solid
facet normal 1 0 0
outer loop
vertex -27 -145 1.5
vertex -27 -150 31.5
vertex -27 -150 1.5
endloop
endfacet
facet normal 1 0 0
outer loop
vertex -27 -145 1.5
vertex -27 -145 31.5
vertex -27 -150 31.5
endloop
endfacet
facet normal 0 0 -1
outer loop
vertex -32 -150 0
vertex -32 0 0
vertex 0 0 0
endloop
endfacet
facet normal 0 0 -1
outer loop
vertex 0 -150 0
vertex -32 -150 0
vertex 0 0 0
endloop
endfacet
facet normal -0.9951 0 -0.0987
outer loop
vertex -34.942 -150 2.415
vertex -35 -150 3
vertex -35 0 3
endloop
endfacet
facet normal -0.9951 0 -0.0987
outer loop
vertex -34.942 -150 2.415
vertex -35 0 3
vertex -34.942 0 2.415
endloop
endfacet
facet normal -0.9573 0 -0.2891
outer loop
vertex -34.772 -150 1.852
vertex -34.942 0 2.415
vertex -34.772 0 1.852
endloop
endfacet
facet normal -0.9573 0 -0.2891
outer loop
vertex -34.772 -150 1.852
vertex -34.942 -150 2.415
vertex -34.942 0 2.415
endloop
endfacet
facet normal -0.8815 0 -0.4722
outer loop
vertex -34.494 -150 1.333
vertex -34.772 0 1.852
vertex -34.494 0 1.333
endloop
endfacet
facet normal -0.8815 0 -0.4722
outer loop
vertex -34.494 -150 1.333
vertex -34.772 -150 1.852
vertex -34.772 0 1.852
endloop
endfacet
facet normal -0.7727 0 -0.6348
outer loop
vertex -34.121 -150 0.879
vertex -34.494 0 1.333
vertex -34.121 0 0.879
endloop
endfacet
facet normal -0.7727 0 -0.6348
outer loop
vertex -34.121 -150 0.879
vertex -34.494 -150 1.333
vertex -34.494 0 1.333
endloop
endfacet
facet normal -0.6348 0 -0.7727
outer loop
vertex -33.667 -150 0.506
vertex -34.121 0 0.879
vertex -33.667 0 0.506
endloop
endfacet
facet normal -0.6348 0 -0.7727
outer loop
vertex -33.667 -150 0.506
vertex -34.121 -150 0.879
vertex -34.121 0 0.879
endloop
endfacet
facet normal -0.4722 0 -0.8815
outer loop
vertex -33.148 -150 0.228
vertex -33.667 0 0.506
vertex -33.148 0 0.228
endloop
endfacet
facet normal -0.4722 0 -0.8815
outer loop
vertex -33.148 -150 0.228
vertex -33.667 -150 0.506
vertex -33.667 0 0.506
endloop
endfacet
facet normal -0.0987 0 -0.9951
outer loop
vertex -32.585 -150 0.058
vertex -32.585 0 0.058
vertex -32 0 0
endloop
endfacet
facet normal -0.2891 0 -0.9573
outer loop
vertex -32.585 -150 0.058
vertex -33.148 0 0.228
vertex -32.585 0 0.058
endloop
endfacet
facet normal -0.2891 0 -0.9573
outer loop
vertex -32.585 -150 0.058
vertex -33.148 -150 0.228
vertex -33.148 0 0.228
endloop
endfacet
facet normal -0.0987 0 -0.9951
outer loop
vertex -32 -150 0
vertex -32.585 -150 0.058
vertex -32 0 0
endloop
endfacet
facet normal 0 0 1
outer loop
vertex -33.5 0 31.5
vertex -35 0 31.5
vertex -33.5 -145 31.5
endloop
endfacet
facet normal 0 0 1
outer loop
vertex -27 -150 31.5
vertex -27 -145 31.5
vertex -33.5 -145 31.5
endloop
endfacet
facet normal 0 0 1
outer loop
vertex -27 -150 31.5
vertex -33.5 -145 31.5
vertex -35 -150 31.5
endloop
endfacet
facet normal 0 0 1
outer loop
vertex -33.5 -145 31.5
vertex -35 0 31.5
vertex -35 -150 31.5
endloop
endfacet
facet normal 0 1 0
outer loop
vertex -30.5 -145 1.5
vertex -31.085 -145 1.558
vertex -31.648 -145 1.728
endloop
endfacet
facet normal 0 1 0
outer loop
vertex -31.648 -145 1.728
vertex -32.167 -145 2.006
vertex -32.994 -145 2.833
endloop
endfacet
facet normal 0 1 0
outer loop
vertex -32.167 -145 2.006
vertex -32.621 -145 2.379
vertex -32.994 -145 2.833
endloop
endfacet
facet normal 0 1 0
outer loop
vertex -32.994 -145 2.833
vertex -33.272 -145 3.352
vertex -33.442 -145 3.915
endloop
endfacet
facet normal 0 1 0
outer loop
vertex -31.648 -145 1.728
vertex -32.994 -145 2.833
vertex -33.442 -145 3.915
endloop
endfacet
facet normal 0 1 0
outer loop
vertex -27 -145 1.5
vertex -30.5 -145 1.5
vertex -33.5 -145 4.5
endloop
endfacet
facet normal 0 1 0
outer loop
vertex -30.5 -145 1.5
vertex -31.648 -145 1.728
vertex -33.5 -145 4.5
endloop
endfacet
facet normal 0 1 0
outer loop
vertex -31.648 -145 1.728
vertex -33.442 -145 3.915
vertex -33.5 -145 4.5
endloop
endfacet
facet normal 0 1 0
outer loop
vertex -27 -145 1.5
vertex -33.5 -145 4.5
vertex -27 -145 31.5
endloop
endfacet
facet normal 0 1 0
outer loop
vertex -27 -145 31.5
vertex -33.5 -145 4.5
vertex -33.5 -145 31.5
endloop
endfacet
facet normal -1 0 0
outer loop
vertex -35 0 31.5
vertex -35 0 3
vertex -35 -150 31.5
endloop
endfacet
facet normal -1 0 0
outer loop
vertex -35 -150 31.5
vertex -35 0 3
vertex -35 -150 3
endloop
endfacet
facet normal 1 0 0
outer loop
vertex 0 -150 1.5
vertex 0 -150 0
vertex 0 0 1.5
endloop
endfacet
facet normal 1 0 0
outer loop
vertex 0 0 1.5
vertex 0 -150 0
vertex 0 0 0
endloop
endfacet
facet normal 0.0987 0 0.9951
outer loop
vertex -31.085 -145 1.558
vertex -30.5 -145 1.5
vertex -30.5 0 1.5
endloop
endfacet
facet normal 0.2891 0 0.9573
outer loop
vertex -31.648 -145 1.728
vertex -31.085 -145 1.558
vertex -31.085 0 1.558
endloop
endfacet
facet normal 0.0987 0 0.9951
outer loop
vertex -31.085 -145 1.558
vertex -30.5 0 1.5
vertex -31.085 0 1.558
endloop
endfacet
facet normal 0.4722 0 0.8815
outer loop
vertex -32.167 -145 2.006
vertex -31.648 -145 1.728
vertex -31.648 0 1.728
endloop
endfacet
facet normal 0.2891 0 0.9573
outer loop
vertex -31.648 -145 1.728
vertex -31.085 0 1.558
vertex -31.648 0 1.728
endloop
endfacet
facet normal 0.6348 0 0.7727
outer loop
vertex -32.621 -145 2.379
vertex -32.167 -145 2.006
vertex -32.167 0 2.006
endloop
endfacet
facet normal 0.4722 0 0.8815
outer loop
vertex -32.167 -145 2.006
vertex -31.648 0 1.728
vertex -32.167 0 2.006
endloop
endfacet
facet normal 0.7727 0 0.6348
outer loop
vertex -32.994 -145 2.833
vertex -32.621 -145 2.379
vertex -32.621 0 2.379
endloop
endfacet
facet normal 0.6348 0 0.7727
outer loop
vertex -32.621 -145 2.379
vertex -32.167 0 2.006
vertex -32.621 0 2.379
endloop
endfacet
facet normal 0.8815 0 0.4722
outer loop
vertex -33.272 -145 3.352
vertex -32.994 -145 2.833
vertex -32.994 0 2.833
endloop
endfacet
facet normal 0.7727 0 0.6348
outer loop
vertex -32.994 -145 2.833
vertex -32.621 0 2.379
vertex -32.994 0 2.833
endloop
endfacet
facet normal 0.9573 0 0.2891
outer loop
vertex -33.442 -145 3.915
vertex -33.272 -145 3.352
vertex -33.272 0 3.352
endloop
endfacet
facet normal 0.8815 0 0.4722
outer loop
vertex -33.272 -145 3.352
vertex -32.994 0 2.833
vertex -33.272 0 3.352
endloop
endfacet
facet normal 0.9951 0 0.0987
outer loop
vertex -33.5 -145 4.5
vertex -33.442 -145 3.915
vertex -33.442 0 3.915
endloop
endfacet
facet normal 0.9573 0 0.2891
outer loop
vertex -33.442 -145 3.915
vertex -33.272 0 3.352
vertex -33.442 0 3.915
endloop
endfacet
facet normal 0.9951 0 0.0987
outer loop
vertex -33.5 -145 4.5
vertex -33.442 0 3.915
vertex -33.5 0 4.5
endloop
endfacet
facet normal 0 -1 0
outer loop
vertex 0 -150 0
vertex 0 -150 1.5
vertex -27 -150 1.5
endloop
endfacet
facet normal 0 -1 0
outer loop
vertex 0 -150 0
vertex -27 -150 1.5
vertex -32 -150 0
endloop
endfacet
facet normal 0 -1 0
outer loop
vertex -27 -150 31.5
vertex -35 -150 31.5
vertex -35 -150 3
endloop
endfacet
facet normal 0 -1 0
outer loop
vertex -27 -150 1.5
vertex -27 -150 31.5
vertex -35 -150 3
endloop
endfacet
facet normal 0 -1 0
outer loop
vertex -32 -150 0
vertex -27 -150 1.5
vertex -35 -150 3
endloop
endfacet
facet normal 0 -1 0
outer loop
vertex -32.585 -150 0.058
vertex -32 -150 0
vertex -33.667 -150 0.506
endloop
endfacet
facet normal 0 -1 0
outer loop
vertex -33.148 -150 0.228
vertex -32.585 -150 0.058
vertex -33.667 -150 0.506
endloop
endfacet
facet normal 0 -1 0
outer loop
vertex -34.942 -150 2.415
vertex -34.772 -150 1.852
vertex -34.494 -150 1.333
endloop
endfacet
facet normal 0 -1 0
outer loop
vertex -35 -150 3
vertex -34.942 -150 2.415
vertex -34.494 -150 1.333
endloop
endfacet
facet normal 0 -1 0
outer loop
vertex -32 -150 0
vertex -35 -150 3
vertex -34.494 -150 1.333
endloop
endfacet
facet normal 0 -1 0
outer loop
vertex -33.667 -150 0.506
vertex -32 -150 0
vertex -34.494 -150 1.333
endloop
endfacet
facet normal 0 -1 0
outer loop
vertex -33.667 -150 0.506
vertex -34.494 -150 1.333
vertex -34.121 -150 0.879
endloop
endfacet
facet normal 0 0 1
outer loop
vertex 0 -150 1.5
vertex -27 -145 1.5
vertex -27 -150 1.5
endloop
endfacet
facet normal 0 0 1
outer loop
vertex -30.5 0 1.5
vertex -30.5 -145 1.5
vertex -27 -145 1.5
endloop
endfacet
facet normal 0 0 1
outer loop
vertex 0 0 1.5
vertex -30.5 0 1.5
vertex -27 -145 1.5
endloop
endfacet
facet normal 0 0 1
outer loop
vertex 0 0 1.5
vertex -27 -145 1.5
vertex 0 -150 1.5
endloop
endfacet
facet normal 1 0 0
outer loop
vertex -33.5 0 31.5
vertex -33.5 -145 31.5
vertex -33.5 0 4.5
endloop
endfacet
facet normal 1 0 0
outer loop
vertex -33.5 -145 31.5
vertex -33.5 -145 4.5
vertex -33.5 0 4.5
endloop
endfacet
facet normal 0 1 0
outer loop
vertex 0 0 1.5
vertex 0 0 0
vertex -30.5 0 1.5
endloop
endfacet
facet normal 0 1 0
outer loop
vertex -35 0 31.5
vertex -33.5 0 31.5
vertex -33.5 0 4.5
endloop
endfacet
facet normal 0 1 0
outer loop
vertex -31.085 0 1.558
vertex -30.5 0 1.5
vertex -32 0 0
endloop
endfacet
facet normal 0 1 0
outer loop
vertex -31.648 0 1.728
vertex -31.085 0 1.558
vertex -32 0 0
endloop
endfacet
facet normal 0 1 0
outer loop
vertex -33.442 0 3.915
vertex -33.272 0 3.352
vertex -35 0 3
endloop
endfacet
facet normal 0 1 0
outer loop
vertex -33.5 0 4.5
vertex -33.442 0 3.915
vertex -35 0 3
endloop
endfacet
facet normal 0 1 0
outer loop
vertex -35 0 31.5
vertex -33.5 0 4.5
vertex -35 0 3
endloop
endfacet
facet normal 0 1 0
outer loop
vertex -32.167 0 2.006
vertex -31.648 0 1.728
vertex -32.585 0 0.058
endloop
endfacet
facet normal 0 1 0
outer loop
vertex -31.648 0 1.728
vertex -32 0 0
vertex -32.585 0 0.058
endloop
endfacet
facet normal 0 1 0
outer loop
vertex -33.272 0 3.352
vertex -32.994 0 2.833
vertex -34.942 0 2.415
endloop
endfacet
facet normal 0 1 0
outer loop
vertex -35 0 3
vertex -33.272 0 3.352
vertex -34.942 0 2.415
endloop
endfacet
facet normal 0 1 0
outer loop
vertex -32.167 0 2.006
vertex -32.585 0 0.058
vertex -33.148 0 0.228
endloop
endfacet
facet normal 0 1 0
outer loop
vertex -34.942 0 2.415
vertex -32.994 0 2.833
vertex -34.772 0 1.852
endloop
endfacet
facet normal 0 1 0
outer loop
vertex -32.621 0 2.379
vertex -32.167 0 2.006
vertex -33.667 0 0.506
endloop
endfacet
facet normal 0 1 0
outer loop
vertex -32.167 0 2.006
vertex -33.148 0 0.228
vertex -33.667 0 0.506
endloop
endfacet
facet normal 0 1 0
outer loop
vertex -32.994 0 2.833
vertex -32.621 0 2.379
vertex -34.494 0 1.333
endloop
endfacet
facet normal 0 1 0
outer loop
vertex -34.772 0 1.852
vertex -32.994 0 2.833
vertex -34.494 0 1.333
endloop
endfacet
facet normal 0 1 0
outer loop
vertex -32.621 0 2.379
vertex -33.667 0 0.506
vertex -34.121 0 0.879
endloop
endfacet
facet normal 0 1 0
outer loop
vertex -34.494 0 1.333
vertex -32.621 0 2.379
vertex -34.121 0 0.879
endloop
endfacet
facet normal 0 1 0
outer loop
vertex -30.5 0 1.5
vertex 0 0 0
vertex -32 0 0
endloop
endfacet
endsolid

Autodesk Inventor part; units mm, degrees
ref_plane "YZ Plane" through (0, 0, 0) normal (1, 0, 0) x (0, 1, 0)
ref_plane "XZ Plane" through (0, 0, 0) normal (0, 1, 0) x (-1, 0, 0)
ref_plane "XY Plane" through (0, 0, 0) normal (0, 0, 1) x (1, 0, 0)
ref_plane "Arbeitsebene1" through (0, 0, 0) normal (0, 0, 1) x (1, 0, 0)
sketch "Skizze1" plane through (0, 0, 0) normal (0, 0, 1) x (1, 0, 0)
  line L0 (0, 0) -> (-35, 0)
  line L1 (-35, 0) -> (-35, -150)
  line L2 (-35, -150) -> (0, -150)
  line L3 (0, -150) -> (0, 0)
  dimension "d18" = 35
  dimension "d19" = 150
extrude "Extrusion1" add sketch "Skizze1" along normal blind 1.5
sketch "Skizze2" plane through (0, 0, 1.5) normal (0, 0, 1) x (1, 0, 0)
  line L0 (-35, 0) -> (-35, -150) projected
  line L1 (0, 0) -> (-35, 0) projected
  line L2 (0, -150) -> (0, 0) projected
  line L3 (-35, -150) -> (0, -150) projected
  line L4 (0, 0) -> (-35, 0) projected
  line L5 (-35, -150) -> (-33.5, -150)
  line L6 (-33.5, -150) -> (-33.5, 0)
  line L7 (-33.5, 0) -> (-35, 0)
  line L8 (-35, 0) -> (-35, -150)
  point P0 (0, -87)
  point P1 (-33.5, 0)
  dimension "d20" = 1.5
extrude "Extrusion2" add sketch "Skizze2" along normal blind 30 contours L1 L6 L3 L0
fillet "Rundung2" radius 3 2 edges at (-35, -75, 0) (-33.5, -75, 1.5)
sketch "Skizze6" plane through (-33.5, -150, 31.5) normal (1, 0, 0) x (0, 0, -1)
  line L0 (31.5, 0) -> (31.5, 150) projected
  line L1 (0, 0) -> (31.5, 0)
  line L2 (31.5, 0) -> (31.5, 5)
  line L3 (31.5, 5) -> (0, 5)
  line L4 (0, 5) -> (0, 0)
  line L5 (30.1312, 5) -> (30.1312, 0)
  dimension "d22" = 5
extrude "Extrusion6" add sketch "Skizze6" along normal blind 6.5 contours L1 L4 L3 L5
properties part number "50_Nema12_Linearmotor_150mm_cage"
